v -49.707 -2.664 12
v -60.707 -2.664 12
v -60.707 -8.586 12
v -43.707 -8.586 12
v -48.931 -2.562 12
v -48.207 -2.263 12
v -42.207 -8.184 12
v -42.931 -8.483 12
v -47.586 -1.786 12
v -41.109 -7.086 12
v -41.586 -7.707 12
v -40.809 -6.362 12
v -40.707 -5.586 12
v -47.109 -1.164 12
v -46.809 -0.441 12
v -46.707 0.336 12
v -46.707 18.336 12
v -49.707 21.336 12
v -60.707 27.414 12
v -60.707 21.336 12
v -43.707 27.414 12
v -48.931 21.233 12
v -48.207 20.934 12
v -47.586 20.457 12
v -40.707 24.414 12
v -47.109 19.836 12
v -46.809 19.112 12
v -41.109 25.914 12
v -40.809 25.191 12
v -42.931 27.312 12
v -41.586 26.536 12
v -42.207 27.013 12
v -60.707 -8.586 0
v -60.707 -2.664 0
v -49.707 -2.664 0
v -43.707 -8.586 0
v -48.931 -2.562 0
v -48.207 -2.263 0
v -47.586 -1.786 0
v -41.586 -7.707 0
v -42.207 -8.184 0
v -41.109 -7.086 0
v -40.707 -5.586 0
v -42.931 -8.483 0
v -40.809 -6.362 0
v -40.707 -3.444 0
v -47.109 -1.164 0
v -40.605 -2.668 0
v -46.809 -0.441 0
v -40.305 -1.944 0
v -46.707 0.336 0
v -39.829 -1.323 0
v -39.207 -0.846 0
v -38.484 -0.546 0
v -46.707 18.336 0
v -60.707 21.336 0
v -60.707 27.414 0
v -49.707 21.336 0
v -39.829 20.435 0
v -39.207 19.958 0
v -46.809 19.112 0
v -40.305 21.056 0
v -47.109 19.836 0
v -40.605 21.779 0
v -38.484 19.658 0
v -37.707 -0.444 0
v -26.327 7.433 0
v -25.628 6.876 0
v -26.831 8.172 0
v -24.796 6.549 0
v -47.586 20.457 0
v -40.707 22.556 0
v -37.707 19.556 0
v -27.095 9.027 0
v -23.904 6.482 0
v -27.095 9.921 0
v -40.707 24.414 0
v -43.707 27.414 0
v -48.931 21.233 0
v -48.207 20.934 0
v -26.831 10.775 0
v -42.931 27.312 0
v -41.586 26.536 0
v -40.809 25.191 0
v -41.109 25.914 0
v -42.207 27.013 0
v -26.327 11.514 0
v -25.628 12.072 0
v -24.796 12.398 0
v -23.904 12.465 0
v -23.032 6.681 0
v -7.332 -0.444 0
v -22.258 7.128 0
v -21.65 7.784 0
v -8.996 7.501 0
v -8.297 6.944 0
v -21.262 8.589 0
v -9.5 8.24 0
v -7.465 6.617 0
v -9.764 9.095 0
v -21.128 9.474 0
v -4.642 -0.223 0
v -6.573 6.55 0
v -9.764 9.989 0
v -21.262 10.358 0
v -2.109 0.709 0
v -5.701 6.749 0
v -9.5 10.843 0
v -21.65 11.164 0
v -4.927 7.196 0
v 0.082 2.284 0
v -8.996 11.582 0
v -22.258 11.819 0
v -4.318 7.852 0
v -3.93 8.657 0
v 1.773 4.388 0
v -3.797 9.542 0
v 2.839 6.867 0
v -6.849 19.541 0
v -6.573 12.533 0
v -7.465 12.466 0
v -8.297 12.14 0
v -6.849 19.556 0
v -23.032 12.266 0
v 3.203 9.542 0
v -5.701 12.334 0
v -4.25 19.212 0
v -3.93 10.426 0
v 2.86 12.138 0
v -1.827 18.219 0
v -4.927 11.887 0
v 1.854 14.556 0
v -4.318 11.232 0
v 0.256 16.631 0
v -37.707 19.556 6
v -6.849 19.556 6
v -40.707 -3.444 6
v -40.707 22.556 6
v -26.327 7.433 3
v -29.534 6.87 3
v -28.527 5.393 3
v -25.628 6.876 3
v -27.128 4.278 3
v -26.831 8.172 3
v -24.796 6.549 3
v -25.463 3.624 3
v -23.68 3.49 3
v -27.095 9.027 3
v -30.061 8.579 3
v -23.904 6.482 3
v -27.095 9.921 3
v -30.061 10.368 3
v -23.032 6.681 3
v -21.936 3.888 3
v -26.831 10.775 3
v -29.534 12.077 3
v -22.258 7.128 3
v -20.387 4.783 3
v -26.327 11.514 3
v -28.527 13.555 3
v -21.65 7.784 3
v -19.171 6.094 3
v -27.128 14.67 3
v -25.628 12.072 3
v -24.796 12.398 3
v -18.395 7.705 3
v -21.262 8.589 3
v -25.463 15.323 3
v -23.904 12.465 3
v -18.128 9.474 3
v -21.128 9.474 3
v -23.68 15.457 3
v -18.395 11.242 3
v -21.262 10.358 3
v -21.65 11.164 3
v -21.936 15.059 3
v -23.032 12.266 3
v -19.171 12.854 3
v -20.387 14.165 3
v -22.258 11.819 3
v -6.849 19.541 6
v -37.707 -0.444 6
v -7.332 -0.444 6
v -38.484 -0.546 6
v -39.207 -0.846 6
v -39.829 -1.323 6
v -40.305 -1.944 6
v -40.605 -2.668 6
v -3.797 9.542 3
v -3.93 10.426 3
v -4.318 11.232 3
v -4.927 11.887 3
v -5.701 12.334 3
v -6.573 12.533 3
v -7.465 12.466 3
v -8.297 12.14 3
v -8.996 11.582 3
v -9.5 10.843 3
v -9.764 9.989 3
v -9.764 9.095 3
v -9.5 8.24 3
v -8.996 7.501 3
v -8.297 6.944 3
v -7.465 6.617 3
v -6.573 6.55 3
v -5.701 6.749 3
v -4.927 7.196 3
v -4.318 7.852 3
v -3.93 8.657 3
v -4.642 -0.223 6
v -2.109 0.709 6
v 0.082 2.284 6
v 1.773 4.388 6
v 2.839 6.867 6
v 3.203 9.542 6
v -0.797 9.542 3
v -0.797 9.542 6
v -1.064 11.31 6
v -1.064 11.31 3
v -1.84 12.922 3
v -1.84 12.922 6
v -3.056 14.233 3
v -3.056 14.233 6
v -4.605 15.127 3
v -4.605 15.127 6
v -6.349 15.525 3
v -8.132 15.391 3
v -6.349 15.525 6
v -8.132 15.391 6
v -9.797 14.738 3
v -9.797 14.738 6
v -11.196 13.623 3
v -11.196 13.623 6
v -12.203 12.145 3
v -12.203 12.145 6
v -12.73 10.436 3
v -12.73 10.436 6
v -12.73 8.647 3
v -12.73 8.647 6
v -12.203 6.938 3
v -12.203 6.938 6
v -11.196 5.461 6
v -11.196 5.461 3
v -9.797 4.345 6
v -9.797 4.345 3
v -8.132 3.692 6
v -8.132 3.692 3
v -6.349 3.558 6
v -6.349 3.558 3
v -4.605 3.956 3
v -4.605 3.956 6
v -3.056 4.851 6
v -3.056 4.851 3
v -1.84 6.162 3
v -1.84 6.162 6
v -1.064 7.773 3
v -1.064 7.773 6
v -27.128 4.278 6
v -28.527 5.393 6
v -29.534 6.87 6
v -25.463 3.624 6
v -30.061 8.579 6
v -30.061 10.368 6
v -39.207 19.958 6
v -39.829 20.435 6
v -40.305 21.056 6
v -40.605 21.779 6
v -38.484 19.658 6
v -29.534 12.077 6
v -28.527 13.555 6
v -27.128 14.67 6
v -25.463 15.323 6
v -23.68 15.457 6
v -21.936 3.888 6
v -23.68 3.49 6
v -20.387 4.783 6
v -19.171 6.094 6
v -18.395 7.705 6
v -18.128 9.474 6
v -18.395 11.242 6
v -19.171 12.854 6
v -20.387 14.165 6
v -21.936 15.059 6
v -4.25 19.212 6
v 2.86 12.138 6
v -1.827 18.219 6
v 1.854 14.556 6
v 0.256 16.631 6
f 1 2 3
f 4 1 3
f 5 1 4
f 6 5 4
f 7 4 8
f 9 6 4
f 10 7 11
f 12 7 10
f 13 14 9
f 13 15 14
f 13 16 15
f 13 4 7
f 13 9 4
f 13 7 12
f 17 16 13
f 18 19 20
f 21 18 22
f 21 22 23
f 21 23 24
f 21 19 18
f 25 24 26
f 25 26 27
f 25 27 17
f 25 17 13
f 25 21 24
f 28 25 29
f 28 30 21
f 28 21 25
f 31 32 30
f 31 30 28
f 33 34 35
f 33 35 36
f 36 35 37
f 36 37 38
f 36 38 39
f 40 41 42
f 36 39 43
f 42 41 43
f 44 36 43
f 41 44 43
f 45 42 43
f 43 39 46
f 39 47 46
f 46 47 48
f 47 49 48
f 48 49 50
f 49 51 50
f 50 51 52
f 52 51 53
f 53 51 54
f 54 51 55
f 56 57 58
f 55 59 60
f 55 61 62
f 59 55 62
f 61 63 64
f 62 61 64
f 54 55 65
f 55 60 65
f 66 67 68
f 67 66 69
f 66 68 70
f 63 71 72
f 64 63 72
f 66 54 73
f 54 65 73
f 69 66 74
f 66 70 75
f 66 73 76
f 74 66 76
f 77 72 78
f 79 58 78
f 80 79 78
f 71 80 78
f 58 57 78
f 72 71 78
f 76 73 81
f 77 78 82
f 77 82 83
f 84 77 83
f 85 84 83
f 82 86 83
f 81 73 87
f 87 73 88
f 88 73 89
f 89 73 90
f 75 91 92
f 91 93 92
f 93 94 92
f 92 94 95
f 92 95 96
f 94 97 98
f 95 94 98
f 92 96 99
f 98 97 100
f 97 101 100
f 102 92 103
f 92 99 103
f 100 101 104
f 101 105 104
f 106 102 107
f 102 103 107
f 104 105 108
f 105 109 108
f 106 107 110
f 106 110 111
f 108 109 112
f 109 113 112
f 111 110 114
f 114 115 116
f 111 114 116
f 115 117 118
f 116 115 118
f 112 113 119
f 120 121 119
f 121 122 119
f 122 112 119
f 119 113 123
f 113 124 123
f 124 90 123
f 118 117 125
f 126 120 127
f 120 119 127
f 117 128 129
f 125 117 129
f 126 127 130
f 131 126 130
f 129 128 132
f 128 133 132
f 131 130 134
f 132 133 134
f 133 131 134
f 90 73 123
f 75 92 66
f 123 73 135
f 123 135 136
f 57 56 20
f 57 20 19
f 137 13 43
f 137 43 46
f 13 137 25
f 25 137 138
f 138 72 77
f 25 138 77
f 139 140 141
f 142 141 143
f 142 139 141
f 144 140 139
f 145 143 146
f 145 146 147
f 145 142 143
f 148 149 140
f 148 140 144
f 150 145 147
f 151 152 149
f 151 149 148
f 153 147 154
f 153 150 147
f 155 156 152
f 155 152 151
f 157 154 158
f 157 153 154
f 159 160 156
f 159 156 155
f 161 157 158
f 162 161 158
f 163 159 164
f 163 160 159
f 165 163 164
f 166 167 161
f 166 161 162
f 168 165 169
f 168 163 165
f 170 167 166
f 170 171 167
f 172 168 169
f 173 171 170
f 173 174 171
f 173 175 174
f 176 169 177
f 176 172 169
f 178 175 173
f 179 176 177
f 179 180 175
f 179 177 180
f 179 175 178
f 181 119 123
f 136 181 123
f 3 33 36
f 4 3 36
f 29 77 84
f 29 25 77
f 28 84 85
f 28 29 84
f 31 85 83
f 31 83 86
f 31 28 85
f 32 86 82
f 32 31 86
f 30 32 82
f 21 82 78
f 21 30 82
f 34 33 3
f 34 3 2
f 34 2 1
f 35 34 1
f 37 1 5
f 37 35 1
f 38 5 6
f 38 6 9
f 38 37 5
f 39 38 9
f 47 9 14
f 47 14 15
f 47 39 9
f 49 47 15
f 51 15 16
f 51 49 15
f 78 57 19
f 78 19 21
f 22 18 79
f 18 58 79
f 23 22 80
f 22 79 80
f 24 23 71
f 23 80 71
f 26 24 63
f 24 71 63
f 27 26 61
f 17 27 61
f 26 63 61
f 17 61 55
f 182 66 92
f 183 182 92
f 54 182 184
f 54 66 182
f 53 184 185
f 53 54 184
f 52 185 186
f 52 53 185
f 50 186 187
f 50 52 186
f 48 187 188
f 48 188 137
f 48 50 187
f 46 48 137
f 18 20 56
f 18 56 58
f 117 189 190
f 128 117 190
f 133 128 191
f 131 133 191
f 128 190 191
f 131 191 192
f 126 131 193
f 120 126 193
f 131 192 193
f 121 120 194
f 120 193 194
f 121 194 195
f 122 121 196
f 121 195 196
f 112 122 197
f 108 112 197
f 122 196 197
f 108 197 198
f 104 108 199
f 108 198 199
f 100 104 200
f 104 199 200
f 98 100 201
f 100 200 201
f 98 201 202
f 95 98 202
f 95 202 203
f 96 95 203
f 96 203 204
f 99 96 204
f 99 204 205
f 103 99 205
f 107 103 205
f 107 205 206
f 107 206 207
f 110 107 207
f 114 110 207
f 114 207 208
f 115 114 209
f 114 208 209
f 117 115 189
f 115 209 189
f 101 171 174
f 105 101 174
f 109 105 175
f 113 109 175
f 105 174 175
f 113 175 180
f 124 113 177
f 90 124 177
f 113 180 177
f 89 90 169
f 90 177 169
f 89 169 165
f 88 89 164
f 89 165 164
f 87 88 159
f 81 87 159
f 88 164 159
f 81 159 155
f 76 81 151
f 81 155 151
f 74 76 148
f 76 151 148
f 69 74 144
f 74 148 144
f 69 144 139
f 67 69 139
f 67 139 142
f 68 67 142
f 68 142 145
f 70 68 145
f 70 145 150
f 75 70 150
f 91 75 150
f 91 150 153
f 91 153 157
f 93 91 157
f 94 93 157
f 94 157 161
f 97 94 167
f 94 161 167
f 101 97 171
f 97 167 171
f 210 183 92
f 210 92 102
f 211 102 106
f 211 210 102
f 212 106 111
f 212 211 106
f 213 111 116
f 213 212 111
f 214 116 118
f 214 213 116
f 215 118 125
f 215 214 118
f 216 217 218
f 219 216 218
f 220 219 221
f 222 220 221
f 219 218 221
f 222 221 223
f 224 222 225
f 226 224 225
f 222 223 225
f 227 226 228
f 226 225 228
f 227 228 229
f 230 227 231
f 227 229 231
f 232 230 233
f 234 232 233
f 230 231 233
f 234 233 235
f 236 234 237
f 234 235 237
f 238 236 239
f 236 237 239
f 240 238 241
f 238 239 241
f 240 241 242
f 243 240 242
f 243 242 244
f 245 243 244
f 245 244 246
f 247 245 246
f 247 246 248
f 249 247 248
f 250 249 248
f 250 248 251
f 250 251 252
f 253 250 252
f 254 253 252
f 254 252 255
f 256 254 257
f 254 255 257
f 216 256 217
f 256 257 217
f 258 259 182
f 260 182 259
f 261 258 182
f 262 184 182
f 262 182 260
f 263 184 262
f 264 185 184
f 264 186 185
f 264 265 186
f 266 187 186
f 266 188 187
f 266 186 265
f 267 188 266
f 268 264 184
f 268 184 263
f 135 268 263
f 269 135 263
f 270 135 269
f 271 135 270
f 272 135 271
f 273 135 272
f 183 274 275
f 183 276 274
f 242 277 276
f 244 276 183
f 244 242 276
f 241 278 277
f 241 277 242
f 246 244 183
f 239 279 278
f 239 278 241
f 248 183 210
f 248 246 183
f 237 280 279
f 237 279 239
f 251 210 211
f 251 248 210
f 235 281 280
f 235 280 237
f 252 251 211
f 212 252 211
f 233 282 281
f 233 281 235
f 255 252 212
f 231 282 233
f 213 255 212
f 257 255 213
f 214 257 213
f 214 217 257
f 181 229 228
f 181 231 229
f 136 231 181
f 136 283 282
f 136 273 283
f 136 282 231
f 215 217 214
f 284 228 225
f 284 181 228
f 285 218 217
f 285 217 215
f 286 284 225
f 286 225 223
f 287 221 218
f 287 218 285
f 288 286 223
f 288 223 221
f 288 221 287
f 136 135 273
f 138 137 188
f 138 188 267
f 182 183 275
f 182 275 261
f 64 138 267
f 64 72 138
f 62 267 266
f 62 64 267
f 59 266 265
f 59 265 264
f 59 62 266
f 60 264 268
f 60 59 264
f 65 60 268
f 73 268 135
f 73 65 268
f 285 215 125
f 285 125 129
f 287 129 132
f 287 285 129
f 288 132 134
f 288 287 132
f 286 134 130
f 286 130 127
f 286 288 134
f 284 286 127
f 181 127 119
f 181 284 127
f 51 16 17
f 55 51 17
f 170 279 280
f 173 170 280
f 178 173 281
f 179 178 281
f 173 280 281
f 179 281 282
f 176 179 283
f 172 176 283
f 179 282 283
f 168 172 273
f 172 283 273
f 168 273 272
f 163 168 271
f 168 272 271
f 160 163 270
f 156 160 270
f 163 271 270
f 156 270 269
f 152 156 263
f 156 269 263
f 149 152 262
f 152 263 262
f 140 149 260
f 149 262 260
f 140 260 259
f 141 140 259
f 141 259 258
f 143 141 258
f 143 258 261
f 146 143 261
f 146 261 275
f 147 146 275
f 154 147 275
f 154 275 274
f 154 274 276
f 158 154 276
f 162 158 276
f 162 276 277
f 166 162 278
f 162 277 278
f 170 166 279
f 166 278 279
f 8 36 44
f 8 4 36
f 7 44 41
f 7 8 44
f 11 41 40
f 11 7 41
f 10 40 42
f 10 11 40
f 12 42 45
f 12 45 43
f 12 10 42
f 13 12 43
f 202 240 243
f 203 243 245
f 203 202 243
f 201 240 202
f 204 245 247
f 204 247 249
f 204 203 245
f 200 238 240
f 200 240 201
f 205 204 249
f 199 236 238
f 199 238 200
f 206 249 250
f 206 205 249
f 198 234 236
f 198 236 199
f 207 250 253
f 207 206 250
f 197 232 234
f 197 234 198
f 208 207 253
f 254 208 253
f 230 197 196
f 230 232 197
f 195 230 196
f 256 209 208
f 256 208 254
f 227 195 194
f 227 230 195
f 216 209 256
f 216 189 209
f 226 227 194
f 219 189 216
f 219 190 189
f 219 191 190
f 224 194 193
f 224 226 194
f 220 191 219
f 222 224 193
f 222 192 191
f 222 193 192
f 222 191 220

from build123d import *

# Parameters (mm, degrees)
F0_W      = 20
F0_H      = 36
F1_DEPTH  = 12
F2_W      = 14
F2_H      = 24
F3_DEPTH  = 25
F4_R      = 3
F5_R      = 3
F6_W      = 34
F6_H      = 20
F7_DEPTH  = 6
F8_R      = 3
F9_R      = 3
F12_DEPTH = 6
F13_R     = 6
F14_DEPTH = 3
F15_R     = 6
F16_DEPTH = 3
F17_R     = 3
F18_DEPTH = 3
F19_R     = 3
F20_DEPTH = 3


with BuildPart() as f1:
    # F0 (on Top) → F1 (new body)
    with BuildSketch(Plane.XY):
        with Locations((-50.7072380185, 9.4144733921)):
            Rectangle(F0_W, F0_H)
    extrude(amount=F1_DEPTH)

    # F2 (on face) → F3 (cut)
    with BuildSketch(Plane.XY.offset(12)):
        with Locations((-53.7072380185, 9.3355261609)):
            Rectangle(F2_W, F2_H)
    extrude(amount=-F3_DEPTH, mode=Mode.SUBTRACT)

    # F4
    f4_edges = [f1.edges().sort_by_distance(p)[0] for p in [
        (-40.707238, -8.585527, 6),
    ]]
    fillet(f4_edges, radius=F4_R)

    # F5
    f5_edges = [f1.edges().sort_by_distance(p)[0] for p in [
        (-40.707238, 27.414473, 6),
        (-46.707238, -2.664474, 6),
        (-46.707238, 21.335526, 6),
    ]]
    fillet(f5_edges, radius=F5_R)

    # F6 (on Top) → F7 (join)
    with BuildSketch(Plane.XY):
        with Locations((-23.8486053348, 9.5559203671)):
            Rectangle(F6_W, F6_H)
    extrude(amount=F7_DEPTH)

    # F8
    f8_edges = [f1.edges().sort_by_distance(p)[0] for p in [
        (-40.707238, 19.55592, 3),
    ]]
    fillet(f8_edges, radius=F8_R)

    # F9
    f9_edges = [f1.edges().sort_by_distance(p)[0] for p in [
        (-40.707238, -0.44408, 3),
    ]]
    fillet(f9_edges, radius=F9_R)

    # F11 (on face) → F12 (join)
    with BuildSketch(Plane.XY.offset(6)):
        with BuildLine():
            ThreePointArc((-7.331625772, -0.4440796329), (0.0823230872, 2.2840744477), (3.2027962059, 9.5416298136))
            ThreePointArc((3.2027962059, 9.5416298136), (0.2556674153, 16.630847521), (-6.8486053348, 19.5414977068))
            Line((-6.8486053348, 19.5414977068), (-6.8486053348, 9.5559203671))
            Line((-6.8486053348, 9.5559203671), (-6.8486053348, -0.4440796329))
            Line((-6.8486053348, -0.4440796329), (-7.331625772, -0.4440796329))
        make_face()
    extrude(amount=-F12_DEPTH)

    # F13 (on face) → F14 (cut)
    with BuildSketch(Plane.XY.offset(6)):
        with Locations((-6.7972037941, 9.5416298136)):
            Circle(F13_R)
    extrude(amount=-F14_DEPTH, mode=Mode.SUBTRACT)

    # F15 (on face) → F16 (cut)
    with BuildSketch(Plane.XY.offset(6)):
        with Locations((-24.1282898933, 9.4736851752)):
            Circle(F15_R)
    extrude(amount=-F16_DEPTH, mode=Mode.SUBTRACT)

    # F17 (on face) → F18 (cut)
    with BuildSketch(Plane.XY.offset(3)):
        with Locations((-24.1282898933, 9.4736851752)):
            Circle(F17_R)
    extrude(amount=-F18_DEPTH, mode=Mode.SUBTRACT)

    # F19 (on face) → F20 (cut)
    with BuildSketch(Plane.XY.offset(3)):
        with Locations((-6.7972037941, 9.5416298136)):
            Circle(F19_R)
    extrude(amount=-F20_DEPTH, mode=Mode.SUBTRACT)


solid = f1.part
